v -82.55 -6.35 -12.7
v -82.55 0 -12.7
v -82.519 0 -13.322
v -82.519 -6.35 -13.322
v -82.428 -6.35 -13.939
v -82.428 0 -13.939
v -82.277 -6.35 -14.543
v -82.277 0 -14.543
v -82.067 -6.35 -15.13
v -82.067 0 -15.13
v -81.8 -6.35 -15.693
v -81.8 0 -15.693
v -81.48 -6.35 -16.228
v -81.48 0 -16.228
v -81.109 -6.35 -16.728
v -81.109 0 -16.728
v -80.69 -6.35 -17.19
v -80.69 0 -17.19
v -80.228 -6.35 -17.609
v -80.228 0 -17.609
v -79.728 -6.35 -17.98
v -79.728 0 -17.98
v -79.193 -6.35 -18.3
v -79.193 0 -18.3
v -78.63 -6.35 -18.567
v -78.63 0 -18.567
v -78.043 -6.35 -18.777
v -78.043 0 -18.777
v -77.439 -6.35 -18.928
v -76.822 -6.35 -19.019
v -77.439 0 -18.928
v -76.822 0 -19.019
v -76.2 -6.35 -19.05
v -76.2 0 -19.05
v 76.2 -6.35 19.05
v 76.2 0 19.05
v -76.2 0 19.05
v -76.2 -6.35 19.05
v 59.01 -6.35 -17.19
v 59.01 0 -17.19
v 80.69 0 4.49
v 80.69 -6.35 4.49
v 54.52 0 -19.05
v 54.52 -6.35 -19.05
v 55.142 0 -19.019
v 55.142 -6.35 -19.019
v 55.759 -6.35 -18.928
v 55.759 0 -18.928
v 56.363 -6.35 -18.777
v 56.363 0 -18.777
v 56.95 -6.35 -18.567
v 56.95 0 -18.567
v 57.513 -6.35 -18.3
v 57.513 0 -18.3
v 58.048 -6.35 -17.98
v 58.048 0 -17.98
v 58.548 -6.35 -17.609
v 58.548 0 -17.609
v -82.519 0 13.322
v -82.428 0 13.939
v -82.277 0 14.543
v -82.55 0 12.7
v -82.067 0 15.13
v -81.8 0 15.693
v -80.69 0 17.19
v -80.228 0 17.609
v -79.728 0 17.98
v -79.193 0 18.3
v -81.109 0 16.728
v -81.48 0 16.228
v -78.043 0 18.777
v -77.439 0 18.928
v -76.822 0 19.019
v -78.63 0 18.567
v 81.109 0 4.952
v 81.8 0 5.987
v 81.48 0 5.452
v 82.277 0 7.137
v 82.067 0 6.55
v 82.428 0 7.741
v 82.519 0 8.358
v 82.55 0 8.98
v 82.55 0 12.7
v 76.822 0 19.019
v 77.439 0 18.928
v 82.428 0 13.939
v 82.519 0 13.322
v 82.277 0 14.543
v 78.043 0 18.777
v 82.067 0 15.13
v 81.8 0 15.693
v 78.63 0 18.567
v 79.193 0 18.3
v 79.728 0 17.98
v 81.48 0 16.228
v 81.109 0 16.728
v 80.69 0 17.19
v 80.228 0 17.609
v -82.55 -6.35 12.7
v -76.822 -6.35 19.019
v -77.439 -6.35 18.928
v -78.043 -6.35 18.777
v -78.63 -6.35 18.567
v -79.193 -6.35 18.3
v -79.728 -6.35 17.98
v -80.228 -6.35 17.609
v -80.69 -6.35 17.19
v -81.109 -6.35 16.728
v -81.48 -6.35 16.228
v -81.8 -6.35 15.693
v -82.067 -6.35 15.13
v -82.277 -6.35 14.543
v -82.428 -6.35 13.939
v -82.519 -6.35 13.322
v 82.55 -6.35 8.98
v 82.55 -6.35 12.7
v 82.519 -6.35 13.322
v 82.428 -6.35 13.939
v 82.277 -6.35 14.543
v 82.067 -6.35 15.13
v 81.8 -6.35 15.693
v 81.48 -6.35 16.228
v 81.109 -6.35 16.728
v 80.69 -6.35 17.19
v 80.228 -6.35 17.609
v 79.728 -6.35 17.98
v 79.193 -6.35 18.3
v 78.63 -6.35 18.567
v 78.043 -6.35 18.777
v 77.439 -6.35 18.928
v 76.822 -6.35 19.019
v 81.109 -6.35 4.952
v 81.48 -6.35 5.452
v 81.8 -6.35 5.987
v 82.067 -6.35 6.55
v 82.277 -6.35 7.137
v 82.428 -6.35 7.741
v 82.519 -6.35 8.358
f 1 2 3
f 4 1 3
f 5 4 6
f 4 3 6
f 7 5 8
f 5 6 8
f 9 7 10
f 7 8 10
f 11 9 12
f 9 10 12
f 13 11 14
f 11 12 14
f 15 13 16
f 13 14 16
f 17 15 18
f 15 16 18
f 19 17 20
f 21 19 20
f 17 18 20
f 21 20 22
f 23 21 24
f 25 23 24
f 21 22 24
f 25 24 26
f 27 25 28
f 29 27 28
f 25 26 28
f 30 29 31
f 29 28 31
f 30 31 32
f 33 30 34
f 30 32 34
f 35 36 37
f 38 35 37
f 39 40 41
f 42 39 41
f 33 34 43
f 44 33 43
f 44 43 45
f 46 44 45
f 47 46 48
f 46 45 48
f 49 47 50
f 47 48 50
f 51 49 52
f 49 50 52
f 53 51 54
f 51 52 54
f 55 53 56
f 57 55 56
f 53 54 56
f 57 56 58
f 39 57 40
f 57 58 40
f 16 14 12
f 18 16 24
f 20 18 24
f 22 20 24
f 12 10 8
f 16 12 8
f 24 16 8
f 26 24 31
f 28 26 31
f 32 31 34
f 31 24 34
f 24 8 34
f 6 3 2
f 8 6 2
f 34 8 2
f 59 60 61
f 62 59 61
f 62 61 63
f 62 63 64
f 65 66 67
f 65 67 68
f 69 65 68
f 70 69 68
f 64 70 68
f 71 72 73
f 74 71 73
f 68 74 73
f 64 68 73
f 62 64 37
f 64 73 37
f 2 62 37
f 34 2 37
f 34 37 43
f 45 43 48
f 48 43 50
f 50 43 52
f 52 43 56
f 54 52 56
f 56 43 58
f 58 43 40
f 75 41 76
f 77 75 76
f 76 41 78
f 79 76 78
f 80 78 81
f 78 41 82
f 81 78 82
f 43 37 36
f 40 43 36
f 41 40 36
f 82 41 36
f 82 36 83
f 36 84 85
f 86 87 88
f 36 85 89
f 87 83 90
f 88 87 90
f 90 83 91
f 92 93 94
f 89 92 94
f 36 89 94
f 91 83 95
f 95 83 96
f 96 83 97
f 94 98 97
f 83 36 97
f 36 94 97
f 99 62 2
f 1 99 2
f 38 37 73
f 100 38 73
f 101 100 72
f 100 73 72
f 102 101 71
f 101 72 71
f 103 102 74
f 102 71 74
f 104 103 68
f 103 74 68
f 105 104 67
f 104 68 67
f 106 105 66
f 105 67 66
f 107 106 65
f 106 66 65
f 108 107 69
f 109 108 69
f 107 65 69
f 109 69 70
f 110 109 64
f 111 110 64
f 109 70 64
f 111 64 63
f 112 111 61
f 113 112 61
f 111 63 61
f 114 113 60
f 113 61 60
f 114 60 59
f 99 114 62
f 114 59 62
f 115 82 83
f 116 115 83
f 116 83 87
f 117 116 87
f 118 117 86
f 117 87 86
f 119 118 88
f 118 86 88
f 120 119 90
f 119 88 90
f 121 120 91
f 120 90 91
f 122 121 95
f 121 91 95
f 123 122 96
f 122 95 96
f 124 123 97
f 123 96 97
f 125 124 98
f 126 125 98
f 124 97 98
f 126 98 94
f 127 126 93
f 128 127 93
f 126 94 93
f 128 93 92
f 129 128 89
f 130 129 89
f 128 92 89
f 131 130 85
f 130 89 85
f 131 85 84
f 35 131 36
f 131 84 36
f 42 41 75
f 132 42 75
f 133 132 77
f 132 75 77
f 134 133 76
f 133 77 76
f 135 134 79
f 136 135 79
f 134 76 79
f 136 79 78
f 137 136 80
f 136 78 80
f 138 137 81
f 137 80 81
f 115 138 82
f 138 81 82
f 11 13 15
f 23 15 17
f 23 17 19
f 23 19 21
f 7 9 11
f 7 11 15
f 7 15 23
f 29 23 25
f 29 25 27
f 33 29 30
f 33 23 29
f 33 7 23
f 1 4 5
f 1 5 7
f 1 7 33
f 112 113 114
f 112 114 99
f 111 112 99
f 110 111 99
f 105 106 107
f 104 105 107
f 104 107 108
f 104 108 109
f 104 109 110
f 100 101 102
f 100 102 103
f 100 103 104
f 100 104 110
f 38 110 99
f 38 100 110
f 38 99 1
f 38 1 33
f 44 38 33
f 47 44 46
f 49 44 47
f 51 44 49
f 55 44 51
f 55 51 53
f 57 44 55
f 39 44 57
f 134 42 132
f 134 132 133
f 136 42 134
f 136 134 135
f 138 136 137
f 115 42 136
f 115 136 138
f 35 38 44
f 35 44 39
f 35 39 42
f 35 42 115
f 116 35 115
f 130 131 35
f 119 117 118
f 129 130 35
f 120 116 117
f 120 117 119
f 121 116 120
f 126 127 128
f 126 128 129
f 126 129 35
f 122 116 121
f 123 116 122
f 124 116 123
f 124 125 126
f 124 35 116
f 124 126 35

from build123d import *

# Parameters (mm, degrees)
F1_DEPTH = 6.35


with BuildPart() as f1:
    # F0 (on Front) → F1 (new body)
    with BuildSketch(Plane.XZ):
        with BuildLine():
            ThreePointArc((82.55, 12.7), (80.690128, 17.190128), (76.2, 19.05))
            Line((76.2, 19.05), (-76.2, 19.05))
            ThreePointArc((-76.2, 19.05), (-80.690128, 17.190128), (-82.55, 12.7))
            Line((-82.55, 12.7), (-82.55, -12.7))
            ThreePointArc((-82.55, -12.7), (-80.690128, -17.190128), (-76.2, -19.05))
            Line((-76.2, -19.05), (54.519744, -19.05))
            ThreePointArc((54.519744, -19.05), (56.949784, -18.566635), (59.009872, -17.190128))
            Line((59.009872, -17.190128), (80.690128, 4.490128))
            ThreePointArc((80.690128, 4.490128), (82.066635, 6.550216), (82.55, 8.980256))
            Line((82.55, 8.980256), (82.55, 12.7))
        make_face()
    extrude(amount=F1_DEPTH)


solid = f1.part
